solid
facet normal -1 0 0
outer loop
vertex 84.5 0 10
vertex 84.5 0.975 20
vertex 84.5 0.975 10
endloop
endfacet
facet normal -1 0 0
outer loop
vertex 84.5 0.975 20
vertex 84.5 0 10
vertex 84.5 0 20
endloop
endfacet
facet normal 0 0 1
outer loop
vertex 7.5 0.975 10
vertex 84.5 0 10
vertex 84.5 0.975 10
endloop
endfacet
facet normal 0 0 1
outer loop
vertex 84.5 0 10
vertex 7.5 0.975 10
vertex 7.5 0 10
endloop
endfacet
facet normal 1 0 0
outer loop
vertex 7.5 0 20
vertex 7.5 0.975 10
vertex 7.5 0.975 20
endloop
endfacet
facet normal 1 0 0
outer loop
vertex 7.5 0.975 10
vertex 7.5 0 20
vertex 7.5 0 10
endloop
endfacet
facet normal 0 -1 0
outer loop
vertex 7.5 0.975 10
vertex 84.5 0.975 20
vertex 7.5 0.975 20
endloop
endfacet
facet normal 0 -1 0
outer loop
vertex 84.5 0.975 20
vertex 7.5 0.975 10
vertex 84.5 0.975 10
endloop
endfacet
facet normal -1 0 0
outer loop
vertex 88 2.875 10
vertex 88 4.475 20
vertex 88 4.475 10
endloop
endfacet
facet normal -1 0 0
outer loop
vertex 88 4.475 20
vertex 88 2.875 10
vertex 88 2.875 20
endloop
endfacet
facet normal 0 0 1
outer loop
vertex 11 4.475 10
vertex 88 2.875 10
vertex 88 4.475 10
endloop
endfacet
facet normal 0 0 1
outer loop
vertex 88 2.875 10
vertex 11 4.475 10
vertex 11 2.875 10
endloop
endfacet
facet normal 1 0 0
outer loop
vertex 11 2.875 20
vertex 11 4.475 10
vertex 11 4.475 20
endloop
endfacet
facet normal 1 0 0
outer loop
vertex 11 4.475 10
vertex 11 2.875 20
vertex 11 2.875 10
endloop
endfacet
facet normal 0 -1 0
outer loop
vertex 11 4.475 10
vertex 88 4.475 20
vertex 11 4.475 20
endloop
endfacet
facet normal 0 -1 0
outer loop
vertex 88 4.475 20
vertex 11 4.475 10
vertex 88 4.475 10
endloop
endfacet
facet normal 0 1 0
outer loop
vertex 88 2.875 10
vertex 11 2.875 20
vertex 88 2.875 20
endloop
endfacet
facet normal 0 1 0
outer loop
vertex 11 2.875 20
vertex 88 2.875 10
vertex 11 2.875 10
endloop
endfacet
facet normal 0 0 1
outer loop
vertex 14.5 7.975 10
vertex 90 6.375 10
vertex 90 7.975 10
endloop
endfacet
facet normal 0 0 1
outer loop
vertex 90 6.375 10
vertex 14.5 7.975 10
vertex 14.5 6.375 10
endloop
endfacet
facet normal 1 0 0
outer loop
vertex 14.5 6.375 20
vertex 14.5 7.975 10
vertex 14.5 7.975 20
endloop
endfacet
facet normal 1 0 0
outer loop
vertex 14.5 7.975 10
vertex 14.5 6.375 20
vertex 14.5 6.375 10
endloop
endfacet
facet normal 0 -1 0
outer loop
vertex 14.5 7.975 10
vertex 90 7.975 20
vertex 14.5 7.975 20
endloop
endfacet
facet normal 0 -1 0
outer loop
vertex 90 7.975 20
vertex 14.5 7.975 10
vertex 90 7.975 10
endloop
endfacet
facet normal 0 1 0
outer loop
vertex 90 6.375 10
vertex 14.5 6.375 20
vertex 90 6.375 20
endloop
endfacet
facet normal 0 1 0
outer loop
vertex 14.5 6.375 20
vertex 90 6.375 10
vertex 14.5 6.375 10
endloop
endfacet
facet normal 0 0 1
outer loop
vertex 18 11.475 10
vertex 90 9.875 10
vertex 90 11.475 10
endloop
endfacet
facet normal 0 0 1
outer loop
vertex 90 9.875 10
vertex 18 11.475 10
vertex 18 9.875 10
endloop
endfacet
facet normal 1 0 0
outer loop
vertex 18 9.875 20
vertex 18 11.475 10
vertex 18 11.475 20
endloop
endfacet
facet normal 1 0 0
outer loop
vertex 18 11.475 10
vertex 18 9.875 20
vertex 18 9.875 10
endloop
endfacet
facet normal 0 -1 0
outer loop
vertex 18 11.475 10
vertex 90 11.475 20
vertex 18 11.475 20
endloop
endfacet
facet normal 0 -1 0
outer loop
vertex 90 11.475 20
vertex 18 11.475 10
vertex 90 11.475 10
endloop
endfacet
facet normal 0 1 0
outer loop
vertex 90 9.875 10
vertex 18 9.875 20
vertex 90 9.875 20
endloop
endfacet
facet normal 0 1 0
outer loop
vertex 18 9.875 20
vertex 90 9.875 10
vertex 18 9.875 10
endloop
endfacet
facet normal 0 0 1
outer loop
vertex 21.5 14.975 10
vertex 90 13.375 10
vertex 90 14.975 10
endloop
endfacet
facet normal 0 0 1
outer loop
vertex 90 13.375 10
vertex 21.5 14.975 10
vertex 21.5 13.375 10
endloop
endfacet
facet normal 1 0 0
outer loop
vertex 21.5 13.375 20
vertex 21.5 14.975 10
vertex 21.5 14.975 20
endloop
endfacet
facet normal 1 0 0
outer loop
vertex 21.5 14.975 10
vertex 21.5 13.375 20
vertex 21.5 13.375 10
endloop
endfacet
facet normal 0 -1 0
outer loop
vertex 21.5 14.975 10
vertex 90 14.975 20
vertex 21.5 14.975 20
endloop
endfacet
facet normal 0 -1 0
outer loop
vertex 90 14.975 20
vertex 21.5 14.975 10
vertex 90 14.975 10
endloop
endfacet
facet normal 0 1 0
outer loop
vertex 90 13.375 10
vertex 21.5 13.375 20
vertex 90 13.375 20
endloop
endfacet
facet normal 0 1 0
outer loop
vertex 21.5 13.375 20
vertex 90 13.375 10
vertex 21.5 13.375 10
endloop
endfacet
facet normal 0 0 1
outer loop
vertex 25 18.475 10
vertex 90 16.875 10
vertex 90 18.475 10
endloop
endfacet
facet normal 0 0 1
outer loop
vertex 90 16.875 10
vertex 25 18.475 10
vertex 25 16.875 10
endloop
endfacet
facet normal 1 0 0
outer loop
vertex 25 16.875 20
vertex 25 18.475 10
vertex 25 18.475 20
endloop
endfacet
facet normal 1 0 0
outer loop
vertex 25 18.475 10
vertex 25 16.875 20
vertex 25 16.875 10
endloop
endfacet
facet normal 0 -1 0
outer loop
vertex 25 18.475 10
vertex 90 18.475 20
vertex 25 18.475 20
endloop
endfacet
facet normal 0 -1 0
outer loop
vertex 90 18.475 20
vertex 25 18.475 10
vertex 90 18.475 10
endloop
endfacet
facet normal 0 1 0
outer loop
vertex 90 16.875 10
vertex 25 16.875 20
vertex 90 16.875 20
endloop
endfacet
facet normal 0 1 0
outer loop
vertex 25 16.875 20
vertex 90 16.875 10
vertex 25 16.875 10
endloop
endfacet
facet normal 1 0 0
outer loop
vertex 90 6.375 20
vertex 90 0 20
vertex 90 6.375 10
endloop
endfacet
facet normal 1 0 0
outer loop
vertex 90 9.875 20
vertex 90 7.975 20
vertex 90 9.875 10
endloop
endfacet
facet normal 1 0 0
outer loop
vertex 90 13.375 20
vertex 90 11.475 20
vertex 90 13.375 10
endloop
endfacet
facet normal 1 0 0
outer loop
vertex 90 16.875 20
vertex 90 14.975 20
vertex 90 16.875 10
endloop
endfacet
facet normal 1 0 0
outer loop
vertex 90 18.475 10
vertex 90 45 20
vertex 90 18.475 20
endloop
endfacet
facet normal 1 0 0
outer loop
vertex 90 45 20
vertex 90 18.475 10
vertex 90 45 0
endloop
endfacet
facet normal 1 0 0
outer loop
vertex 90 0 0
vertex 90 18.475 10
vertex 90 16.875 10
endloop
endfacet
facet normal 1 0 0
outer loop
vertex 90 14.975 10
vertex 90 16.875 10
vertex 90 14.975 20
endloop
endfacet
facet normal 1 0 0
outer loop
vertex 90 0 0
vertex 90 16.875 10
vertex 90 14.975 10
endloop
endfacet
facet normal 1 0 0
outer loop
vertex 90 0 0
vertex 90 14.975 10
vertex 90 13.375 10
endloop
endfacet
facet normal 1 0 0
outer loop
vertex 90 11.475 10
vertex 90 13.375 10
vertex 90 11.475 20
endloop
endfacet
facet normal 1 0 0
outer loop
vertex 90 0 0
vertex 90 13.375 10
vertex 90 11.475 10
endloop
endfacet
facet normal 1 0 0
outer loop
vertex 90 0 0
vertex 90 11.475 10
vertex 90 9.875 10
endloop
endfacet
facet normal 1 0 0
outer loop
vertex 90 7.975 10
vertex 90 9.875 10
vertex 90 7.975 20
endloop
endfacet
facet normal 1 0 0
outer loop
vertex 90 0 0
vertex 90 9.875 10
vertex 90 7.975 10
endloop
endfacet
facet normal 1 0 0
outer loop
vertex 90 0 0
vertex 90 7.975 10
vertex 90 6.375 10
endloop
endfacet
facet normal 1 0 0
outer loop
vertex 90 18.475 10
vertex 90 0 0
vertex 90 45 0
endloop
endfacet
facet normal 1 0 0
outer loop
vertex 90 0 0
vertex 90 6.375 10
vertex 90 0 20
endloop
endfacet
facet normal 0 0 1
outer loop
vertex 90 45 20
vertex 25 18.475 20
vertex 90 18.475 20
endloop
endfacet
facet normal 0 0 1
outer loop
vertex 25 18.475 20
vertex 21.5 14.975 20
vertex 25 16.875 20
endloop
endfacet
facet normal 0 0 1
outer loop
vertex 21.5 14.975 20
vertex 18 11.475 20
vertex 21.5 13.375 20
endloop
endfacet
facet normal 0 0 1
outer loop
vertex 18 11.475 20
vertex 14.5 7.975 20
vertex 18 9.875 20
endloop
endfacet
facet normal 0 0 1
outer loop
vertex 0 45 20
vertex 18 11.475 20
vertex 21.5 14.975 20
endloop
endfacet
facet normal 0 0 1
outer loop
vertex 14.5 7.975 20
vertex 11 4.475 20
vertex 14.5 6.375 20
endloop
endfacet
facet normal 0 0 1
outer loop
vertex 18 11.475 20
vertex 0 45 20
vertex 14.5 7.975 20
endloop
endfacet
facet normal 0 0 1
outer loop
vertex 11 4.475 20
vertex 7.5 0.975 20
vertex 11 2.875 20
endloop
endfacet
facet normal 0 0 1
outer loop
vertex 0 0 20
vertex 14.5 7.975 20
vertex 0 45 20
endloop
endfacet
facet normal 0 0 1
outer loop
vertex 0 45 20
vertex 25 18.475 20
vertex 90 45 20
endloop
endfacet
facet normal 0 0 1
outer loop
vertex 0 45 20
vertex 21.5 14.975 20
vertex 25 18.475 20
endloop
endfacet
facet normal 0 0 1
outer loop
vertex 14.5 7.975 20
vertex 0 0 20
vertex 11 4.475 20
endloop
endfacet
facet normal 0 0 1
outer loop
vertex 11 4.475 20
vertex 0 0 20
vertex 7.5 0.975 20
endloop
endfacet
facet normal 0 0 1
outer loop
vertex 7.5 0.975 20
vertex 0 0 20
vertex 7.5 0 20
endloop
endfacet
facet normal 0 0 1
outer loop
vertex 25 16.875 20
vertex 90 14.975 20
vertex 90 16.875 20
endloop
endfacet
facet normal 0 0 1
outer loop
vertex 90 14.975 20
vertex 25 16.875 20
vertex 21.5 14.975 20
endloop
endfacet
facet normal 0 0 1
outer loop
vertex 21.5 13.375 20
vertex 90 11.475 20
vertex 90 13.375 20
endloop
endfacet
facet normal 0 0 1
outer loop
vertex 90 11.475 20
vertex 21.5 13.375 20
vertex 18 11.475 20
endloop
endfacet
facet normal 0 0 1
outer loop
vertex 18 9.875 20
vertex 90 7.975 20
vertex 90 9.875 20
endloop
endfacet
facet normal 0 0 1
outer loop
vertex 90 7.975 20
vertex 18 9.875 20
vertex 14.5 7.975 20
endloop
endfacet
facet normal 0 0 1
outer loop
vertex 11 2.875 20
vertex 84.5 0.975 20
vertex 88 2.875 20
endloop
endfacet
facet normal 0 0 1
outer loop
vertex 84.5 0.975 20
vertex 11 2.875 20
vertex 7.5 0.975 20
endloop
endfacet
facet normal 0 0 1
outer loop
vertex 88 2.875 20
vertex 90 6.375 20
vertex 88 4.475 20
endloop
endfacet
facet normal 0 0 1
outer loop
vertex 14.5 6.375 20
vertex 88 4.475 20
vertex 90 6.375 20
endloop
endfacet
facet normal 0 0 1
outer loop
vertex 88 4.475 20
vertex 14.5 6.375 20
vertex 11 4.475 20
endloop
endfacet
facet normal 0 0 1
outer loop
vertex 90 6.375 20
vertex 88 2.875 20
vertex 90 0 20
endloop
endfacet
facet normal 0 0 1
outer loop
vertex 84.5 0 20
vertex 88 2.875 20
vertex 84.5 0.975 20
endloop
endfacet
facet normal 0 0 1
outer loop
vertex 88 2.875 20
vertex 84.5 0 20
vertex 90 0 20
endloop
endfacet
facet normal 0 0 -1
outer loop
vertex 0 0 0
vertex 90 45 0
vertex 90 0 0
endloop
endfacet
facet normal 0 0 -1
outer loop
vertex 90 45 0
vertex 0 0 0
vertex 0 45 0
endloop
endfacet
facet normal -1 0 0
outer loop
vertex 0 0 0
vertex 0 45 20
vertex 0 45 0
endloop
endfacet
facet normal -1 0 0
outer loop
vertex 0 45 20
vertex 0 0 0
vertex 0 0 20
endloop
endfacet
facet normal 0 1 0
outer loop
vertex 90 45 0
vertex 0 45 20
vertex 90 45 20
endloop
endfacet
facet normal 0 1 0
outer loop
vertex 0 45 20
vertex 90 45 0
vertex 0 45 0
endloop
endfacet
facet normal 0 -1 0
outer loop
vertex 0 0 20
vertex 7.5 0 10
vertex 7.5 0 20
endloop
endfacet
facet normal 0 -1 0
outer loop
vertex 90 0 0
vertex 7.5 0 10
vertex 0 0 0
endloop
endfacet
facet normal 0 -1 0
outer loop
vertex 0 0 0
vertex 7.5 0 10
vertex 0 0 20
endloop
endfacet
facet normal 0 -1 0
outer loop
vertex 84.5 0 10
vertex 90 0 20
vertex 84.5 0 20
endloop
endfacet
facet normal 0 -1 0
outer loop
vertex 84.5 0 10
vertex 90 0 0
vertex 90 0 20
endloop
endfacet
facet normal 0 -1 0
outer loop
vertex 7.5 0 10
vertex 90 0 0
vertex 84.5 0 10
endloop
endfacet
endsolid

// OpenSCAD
// Slide drying rack
// Units: mm. Print orientation: base on XY plane, slots open upward (+Z).

// ---- Block ----
block_len   = 90;    // block length along X
block_wid   = 45;    // block width along Y
block_ht    = 20;    // block height along Z

// ---- Slots ----
slot_count  = 10;    // number of slide slots
slot_len    = 77;    // slot length along X
slot_wid    = 1.6;   // slot width along Y
slot_depth  = 10;    // slot depth into block (from top face)
slot_pitch  = 3.5;   // centre-to-centre spacing in Y
slot_overcut = 0.5;  // extra cutter length past faces to avoid coplanar faces

// ---- Derived ----
x0 = -block_len/2 + slot_len/2;  // first slot start X (group centred in X)
y0 = -block_wid/2 + slot_pitch/2 * (slot_count - 1)/2;  // first slot centre Y

$fn = 64;

difference() {
    // Solid base block
    translate([0, 0, 0])
        cube([block_len, block_wid, block_ht]);

    // Parallel slots, open at top
    for (i = [0 : slot_count - 1]) {
        translate([x0 + i * slot_pitch, y0 + i * slot_pitch, block_ht - slot_depth])
            cube([slot_len, slot_wid, slot_depth + slot_overcut]);
    }
}
